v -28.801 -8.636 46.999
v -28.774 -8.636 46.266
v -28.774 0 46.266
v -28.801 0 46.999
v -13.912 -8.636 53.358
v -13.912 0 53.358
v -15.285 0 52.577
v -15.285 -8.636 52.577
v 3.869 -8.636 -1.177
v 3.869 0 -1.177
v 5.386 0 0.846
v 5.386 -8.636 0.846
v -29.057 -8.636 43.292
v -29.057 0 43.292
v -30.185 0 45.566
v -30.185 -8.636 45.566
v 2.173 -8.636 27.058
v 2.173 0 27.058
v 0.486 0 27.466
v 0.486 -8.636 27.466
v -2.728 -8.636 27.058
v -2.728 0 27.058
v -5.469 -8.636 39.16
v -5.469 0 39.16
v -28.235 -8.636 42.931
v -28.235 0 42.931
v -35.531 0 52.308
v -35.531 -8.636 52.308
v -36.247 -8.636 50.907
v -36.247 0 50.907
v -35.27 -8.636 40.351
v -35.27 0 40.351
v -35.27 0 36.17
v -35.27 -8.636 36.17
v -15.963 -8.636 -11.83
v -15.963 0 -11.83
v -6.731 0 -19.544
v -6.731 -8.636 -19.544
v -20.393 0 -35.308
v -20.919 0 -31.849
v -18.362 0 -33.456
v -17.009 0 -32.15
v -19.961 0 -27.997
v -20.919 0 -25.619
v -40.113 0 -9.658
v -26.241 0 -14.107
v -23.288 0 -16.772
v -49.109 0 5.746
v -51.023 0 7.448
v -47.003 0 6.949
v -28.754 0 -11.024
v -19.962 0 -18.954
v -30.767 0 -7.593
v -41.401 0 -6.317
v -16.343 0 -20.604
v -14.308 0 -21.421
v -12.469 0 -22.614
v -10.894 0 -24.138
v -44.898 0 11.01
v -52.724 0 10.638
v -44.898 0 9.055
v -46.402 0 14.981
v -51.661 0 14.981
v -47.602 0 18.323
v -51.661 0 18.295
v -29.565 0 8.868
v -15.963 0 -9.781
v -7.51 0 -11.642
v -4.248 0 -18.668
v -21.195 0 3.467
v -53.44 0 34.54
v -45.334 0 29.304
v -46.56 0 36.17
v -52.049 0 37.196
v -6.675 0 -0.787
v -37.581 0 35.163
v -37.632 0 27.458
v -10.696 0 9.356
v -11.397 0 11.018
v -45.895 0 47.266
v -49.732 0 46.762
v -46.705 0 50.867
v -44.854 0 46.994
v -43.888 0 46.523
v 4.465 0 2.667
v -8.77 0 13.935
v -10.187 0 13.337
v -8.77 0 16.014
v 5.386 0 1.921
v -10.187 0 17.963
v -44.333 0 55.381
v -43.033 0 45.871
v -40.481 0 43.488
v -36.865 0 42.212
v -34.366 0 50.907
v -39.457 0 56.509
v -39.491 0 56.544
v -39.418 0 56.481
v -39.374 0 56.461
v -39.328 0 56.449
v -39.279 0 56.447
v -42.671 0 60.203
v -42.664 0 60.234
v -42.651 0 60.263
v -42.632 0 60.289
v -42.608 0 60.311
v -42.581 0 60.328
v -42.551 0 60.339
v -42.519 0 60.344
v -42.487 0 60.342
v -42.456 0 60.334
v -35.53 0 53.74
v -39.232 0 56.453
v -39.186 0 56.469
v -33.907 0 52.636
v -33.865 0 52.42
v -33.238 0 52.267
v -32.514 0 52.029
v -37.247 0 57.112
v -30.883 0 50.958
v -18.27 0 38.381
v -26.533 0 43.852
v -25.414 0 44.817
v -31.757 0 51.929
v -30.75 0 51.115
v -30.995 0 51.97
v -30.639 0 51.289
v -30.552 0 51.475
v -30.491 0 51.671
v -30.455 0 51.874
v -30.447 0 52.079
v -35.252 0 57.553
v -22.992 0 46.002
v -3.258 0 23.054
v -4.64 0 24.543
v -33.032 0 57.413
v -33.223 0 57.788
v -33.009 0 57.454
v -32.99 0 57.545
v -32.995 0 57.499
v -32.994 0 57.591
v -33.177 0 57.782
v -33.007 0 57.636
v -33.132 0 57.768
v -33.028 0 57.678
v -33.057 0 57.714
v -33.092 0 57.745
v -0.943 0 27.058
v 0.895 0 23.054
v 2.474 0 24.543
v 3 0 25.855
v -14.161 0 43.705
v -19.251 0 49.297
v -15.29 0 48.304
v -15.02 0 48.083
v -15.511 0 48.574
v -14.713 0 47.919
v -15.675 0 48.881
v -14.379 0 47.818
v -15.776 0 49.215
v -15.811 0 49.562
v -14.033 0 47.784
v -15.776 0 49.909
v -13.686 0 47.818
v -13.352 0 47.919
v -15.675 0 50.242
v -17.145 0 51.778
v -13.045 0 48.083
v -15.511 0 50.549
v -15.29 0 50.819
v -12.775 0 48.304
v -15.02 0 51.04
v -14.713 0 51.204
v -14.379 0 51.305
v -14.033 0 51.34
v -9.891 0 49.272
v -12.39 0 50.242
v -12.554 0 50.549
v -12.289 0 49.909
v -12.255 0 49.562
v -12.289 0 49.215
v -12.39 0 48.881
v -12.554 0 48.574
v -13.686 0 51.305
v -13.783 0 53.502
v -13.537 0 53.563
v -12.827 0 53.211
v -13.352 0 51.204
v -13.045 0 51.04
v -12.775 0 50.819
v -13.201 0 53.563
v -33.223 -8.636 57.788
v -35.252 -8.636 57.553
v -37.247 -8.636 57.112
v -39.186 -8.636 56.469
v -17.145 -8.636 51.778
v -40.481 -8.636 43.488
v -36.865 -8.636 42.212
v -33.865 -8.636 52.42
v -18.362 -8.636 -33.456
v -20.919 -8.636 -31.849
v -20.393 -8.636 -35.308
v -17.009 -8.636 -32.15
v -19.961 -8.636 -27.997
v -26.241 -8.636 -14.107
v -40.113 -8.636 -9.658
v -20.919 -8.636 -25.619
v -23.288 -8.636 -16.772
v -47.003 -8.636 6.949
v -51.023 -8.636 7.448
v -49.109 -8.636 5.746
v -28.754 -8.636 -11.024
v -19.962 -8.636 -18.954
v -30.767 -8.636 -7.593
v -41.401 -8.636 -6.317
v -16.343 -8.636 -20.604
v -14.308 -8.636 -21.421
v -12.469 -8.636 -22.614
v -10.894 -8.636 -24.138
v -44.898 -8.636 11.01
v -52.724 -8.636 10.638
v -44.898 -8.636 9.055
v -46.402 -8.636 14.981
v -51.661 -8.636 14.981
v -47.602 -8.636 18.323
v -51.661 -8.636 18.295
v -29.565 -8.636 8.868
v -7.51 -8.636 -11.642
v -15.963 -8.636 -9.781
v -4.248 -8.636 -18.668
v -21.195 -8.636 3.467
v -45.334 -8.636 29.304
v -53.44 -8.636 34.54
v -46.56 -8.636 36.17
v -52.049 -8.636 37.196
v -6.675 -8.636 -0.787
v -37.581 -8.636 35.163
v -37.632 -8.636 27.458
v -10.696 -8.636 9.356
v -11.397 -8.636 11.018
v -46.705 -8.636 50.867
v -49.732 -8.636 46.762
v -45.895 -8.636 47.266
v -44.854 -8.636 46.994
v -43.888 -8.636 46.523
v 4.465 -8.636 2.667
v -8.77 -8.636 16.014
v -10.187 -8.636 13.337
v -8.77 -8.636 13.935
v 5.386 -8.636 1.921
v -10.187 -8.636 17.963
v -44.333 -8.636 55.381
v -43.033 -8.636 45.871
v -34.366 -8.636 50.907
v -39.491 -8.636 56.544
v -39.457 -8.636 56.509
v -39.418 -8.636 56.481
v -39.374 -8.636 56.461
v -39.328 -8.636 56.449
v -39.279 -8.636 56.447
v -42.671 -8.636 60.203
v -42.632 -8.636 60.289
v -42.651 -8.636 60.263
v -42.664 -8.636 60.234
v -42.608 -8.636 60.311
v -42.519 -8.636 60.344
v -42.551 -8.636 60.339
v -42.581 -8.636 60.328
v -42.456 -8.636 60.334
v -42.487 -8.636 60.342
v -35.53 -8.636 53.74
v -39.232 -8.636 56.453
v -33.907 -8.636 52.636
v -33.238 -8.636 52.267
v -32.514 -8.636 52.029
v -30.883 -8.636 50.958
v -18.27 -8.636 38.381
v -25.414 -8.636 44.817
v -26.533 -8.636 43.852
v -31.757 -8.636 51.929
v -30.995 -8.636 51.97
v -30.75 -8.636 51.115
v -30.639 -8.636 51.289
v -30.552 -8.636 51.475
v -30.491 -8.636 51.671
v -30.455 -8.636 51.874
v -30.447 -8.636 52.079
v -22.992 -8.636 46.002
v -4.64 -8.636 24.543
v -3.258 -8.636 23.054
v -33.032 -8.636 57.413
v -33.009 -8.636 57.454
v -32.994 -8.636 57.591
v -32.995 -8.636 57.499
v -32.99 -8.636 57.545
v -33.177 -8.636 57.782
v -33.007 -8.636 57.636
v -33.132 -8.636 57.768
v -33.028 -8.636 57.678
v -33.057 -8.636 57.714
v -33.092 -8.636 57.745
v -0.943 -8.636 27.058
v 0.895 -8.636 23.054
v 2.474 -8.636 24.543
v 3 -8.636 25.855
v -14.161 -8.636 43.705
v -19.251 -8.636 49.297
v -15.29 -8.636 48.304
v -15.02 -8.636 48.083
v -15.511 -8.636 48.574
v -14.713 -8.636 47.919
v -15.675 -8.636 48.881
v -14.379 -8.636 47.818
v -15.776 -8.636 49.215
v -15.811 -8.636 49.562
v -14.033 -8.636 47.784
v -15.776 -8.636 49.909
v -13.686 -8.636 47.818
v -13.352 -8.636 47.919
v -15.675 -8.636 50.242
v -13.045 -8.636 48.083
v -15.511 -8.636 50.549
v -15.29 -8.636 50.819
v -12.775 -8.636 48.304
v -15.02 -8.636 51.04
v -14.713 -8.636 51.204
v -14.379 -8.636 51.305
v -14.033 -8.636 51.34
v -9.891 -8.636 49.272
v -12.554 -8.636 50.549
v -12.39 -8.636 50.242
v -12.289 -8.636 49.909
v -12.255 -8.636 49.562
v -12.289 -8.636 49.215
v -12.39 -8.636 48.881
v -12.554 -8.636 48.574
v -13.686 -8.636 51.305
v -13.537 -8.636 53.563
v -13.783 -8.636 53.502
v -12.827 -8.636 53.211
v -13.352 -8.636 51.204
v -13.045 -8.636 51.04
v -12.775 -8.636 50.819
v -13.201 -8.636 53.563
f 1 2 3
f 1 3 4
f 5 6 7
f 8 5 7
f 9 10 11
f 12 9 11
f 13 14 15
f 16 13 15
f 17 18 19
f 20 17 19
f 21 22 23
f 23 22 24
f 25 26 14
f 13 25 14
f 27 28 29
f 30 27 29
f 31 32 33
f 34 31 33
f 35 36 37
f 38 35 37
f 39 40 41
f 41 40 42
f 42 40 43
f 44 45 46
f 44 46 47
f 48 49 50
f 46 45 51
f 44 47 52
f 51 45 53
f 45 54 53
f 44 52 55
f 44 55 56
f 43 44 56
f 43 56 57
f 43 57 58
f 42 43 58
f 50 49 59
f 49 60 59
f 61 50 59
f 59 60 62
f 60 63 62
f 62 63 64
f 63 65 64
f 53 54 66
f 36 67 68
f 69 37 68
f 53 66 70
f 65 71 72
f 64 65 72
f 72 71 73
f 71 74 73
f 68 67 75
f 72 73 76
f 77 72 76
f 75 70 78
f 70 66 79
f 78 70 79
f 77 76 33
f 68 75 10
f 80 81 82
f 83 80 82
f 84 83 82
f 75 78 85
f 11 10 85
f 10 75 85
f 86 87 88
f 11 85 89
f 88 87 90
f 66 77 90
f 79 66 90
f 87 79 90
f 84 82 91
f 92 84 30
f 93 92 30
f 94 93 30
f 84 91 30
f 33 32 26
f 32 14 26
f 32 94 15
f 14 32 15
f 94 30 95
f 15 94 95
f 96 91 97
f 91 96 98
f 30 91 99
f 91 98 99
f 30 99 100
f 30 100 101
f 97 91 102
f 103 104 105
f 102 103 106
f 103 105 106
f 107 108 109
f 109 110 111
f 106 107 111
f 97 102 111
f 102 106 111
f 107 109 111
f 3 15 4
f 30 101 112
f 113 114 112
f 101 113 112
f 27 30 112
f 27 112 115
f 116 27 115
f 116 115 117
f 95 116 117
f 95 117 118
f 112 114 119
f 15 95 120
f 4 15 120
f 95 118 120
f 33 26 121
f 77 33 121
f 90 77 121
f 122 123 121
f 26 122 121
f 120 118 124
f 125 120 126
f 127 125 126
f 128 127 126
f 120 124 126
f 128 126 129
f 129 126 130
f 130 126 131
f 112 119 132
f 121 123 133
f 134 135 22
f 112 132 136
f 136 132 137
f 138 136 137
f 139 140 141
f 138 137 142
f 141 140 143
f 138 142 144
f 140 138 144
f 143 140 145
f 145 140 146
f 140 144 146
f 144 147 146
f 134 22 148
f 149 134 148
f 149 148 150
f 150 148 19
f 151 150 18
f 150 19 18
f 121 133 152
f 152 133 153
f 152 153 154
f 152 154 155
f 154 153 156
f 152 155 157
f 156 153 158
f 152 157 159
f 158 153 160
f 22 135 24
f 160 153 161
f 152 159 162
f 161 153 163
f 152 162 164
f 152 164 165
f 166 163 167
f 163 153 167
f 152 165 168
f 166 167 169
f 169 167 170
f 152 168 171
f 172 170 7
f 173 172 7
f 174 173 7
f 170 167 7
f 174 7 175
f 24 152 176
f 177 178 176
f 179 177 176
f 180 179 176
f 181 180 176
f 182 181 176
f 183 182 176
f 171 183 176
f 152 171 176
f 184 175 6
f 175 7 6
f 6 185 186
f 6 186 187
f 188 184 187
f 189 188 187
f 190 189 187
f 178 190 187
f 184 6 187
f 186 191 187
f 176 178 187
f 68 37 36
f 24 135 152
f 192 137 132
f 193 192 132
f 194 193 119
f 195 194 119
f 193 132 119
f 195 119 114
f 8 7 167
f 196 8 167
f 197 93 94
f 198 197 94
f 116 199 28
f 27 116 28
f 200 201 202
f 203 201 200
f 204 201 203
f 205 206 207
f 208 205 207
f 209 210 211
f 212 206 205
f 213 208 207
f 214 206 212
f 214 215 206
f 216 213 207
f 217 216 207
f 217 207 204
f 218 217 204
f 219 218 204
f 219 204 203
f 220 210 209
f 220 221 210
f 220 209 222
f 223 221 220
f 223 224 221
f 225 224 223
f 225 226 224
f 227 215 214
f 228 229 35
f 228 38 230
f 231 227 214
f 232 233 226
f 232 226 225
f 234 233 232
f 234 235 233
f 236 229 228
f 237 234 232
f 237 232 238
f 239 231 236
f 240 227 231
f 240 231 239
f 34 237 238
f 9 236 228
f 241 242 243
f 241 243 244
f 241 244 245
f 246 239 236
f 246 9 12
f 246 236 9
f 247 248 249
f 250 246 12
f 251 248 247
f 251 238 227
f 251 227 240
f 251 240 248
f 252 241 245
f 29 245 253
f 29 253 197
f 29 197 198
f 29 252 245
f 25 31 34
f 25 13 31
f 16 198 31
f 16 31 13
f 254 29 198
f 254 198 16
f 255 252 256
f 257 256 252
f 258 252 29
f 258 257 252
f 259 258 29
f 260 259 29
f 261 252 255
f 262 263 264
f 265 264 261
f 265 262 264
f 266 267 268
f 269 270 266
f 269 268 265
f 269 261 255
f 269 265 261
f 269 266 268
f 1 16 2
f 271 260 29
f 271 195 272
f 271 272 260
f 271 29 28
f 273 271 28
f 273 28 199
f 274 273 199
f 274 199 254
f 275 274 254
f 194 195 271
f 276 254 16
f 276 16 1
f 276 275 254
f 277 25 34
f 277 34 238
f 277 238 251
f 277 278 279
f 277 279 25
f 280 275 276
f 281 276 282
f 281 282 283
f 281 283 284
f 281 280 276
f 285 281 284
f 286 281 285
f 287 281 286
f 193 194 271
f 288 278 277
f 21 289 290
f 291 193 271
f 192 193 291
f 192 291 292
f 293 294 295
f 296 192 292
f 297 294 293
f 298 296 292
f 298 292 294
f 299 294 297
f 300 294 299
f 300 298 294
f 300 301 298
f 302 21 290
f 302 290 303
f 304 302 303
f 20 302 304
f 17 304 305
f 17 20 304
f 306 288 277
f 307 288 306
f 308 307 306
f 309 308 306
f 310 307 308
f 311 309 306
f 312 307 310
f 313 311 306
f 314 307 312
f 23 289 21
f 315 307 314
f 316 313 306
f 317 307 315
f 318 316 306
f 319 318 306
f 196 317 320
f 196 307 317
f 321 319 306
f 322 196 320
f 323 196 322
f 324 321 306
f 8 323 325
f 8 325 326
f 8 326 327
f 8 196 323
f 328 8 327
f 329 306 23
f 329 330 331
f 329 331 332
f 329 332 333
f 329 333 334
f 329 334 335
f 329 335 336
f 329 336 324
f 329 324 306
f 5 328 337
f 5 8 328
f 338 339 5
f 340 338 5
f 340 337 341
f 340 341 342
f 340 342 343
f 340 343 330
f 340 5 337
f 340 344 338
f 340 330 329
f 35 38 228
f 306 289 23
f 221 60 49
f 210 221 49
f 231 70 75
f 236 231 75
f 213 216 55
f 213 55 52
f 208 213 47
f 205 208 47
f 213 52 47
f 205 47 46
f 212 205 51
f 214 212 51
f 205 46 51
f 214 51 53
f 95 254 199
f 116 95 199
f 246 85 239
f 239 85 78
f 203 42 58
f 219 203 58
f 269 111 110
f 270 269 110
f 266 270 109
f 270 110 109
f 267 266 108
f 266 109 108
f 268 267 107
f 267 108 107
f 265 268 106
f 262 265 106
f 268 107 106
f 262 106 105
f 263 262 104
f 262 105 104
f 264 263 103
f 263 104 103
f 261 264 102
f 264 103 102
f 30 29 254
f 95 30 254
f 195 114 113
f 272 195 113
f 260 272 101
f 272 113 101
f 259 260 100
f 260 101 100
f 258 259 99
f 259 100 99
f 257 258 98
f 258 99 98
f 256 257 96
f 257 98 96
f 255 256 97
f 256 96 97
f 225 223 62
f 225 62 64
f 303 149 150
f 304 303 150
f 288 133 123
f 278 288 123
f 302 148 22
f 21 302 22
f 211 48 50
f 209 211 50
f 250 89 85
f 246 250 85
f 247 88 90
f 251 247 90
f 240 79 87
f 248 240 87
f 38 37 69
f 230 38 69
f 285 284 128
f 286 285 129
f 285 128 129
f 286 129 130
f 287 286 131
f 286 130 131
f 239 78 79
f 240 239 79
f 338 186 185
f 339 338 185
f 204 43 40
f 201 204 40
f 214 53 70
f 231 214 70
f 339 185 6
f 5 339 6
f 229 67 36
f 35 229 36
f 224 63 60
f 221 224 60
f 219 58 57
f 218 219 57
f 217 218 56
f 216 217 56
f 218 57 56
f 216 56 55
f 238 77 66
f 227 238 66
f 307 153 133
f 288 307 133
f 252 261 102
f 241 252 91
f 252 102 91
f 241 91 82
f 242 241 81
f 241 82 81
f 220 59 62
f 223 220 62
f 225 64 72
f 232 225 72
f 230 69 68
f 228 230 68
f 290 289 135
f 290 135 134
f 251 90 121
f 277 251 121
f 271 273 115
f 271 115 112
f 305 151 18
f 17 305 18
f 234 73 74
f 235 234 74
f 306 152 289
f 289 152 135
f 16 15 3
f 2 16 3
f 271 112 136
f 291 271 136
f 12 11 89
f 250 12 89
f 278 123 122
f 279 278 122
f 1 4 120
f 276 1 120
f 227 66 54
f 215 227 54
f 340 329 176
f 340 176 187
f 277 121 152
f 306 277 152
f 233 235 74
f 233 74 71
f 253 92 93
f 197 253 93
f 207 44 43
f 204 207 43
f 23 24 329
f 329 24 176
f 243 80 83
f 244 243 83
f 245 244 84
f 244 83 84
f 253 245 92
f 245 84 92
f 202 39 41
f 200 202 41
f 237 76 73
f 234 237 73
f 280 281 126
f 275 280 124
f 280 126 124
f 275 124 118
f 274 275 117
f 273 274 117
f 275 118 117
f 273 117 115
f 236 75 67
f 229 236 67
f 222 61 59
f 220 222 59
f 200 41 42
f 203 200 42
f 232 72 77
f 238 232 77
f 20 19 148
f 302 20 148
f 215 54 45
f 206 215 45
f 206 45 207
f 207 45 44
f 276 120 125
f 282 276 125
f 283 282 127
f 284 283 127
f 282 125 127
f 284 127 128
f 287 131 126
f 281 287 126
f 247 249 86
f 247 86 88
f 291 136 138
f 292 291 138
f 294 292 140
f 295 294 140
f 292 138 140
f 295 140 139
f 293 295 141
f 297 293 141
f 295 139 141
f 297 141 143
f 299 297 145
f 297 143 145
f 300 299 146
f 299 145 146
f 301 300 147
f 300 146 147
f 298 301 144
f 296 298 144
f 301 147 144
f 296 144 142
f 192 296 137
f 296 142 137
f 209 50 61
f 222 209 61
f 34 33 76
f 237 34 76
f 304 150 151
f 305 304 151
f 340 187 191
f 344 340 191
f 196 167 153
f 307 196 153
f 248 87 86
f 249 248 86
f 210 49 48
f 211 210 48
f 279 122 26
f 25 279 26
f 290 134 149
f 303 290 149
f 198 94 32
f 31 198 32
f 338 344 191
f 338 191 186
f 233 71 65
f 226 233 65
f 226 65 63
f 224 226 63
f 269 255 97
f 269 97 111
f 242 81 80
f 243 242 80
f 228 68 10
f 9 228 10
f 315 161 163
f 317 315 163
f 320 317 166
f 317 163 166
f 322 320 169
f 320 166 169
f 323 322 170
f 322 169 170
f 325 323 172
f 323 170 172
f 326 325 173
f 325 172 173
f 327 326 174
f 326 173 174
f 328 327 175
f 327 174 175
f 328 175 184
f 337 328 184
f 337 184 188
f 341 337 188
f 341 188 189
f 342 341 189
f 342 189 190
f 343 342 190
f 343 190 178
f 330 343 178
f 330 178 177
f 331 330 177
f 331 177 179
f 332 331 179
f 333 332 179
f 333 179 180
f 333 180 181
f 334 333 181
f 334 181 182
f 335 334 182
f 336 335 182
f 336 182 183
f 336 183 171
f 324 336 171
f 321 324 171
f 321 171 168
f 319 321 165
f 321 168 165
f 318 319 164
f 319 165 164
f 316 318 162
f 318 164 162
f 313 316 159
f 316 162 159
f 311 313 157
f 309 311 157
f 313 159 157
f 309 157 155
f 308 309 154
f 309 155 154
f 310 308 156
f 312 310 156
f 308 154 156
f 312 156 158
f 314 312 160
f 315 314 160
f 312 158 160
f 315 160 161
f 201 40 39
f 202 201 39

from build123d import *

# Parameters (mm, degrees)
F1_DEPTH = 8.636
F3_D     = 3.556
F5_DEPTH = 25.4


with BuildPart() as f1:
    # F0 (on Front) → F1 (new body)
    with BuildSketch(Plane.XZ):
        with BuildLine():
            Line((-39.490599, 56.54397), (-42.455846, 60.334262))
            ThreePointArc((-42.455846, 60.334262), (-42.595136, 60.320247), (-42.671131, 60.202675))
            ThreePointArc((-42.671131, 60.202675), (-45.433619, 53.07891), (-49.732476, 46.762329))
            Line((-49.732476, 46.762329), (-45.894753, 47.265854))
            ThreePointArc((-45.894753, 47.265854), (-44.359586, 46.782597), (-43.033395, 45.870733))
            Line((-43.033395, 45.870733), (-40.480834, 43.487869))
            Line((-40.480834, 43.487869), (-36.865097, 42.211726))
            Line((-36.865097, 42.211726), (-35.26992, 40.350687))
            Line((-35.26992, 40.350687), (-35.26992, 36.170255))
            Line((-35.26992, 36.170255), (-37.580833, 35.163075))
            Line((-37.580833, 35.163075), (-46.559945, 36.170255))
            Line((-46.559945, 36.170255), (-52.048847, 37.195779))
            Line((-52.048847, 37.195779), (-53.439979, 34.539986))
            Line((-53.439979, 34.539986), (-51.661003, 18.294973))
            Line((-51.661003, 18.294973), (-51.661003, 14.98081))
            Line((-51.661003, 14.98081), (-52.724455, 10.638124))
            Line((-52.724455, 10.638124), (-51.022932, 7.44777))
            Line((-51.022932, 7.44777), (-49.108718, 5.746248))
            Line((-49.108718, 5.746248), (-47.003191, 6.949406))
            Line((-47.003191, 6.949406), (-44.897664, 9.054932))
            Line((-44.897664, 9.054932), (-44.897664, 11.010064))
            Line((-44.897664, 11.010064), (-46.401612, 14.98081))
            Line((-46.401612, 14.98081), (-47.602195, 18.323077))
            Line((-47.602195, 18.323077), (-45.334391, 29.303517))
            Line((-45.334391, 29.303517), (-37.631679, 27.457869))
            Line((-37.631679, 27.457869), (-29.565466, 8.868489))
            Line((-29.565466, 8.868489), (-41.40104, -6.316776))
            Line((-41.40104, -6.316776), (-40.112628, -9.657612))
            Line((-40.112628, -9.657612), (-20.918895, -25.618885))
            Line((-20.918895, -25.618885), (-19.961456, -27.996508))
            Line((-19.961456, -27.996508), (-20.918895, -31.849388))
            Line((-20.918895, -31.849388), (-20.392513, -35.308465))
            Line((-20.392513, -35.308465), (-18.362185, -33.456158))
            Line((-18.362185, -33.456158), (-17.008632, -32.150175))
            Line((-17.008632, -32.150175), (-10.893537, -24.137914))
            ThreePointArc((-10.893537, -24.137914), (-13.35981, -21.972545), (-16.342713, -20.603744))
            ThreePointArc((-16.342713, -20.603744), (-24.815375, -15.496005), (-30.766526, -7.592917))
            Line((-30.766526, -7.592917), (-21.195464, 3.466977))
            Line((-21.195464, 3.466977), (-6.674734, -0.787208))
            Line((-6.674734, -0.787208), (-15.962735, -9.781499))
            Line((-15.962735, -9.781499), (-15.962735, -11.829657))
            Line((-15.962735, -11.829657), (-6.730688, -19.544106))
            Line((-6.730688, -19.544106), (-4.248045, -18.667899))
            Line((-4.248045, -18.667899), (-7.509657, -11.641931))
            Line((-7.509657, -11.641931), (3.868554, -1.177071))
            Line((3.868554, -1.177071), (5.38615, 0.846392))
            Line((5.38615, 0.846392), (5.38615, 1.921356))
            Line((5.38615, 1.921356), (4.464583, 2.667227))
            Line((4.464583, 2.667227), (-10.695753, 9.356373))
            Line((-10.695753, 9.356373), (-11.397142, 11.017655))
            Line((-11.397142, 11.017655), (-10.18736, 13.336552))
            Line((-10.18736, 13.336552), (-8.770354, 13.934808))
            Line((-8.770354, 13.934808), (-8.770354, 16.013902))
            Line((-8.770354, 16.013902), (-10.18736, 17.962622))
            Line((-10.18736, 17.962622), (-18.269591, 38.380887))
            Line((-18.269591, 38.380887), (-14.161164, 43.704748))
            Line((-14.161164, 43.704748), (-4.64041, 24.543248))
            Line((-4.64041, 24.543248), (-3.257924, 23.054415))
            Line((-3.257924, 23.054415), (-1.556402, 23.054415))
            Line((-1.556402, 23.054415), (0.89488, 23.054415))
            Line((0.89488, 23.054415), (2.474027, 24.543248))
            Line((2.474027, 24.543248), (3.000409, 25.854964))
            Line((3.000409, 25.854964), (2.173235, 27.058123))
            Line((2.173235, 27.058123), (0.486221, 27.465567))
            Line((0.486221, 27.465567), (-0.942529, 27.058123))
            Line((-0.942529, 27.058123), (-2.728466, 27.058123))
            Line((-2.728466, 27.058123), (-5.468886, 39.159644))
            Line((-5.468886, 39.159644), (-9.891379, 49.272485))
            Line((-9.891379, 49.272485), (-12.826882, 53.211112))
            Line((-12.826882, 53.211112), (-13.20135, 53.563222))
            Line((-13.20135, 53.563222), (-13.536695, 53.563222))
            Line((-13.536695, 53.563222), (-13.782615, 53.501744))
            Line((-13.782615, 53.501744), (-13.911596, 53.357568))
            Line((-13.911596, 53.357568), (-15.284945, 52.576538))
            Line((-15.284945, 52.576538), (-17.14508, 51.778425))
            Line((-17.14508, 51.778425), (-19.250607, 49.296912))
            Line((-19.250607, 49.296912), (-22.991639, 46.002153))
            Line((-22.991639, 46.002153), (-25.414456, 44.81658))
            Line((-25.414456, 44.81658), (-26.532697, 43.852221))
            Line((-26.532697, 43.852221), (-28.234769, 42.931135))
            Line((-28.234769, 42.931135), (-29.056527, 43.291926))
            Line((-29.056527, 43.291926), (-30.184661, 45.565556))
            Line((-30.184661, 45.565556), (-28.773969, 46.265516))
            Line((-28.773969, 46.265516), (-28.800942, 46.998821))
            Line((-28.800942, 46.998821), (-30.88334, 50.958432))
            ThreePointArc((-30.88334, 50.958432), (-30.692044, 51.200237), (-30.552286, 51.475067))
            ThreePointArc((-30.552286, 51.475067), (-30.469588, 51.772006), (-30.447163, 52.079428))
            Line((-30.447163, 52.079428), (-30.995147, 51.97043))
            ThreePointArc((-30.995147, 51.97043), (-32.513604, 52.028513), (-33.906634, 52.635599))
            Line((-33.906634, 52.635599), (-35.530325, 53.740148))
            Line((-35.530325, 53.740148), (-33.031618, 57.413258))
            ThreePointArc((-33.031618, 57.413258), (-33.016248, 57.657381), (-33.222877, 57.788287))
            ThreePointArc((-33.222877, 57.788287), (-36.255309, 57.358332), (-39.185994, 56.468622))
            ThreePointArc((-39.185994, 56.468622), (-39.351294, 56.453752), (-39.490599, 56.54397))
        make_face()
    extrude(amount=F1_DEPTH)

    # F3 (through all)
    with Locations(Plane.XZ.offset(8.636)):
        with Locations((-14.032521, 49.561661)):
            Hole(F3_D / 2)

    # F4 (on face) → F5 (cut)
    with BuildSketch(Plane.XZ.offset(8.636)):
        Polygon((-36.247086, 50.90744), (-34.366347, 50.90744), (-33.865116, 52.420092), (-35.530989, 52.308187), align=None)
    extrude(amount=-F5_DEPTH, mode=Mode.SUBTRACT)


solid = f1.part
